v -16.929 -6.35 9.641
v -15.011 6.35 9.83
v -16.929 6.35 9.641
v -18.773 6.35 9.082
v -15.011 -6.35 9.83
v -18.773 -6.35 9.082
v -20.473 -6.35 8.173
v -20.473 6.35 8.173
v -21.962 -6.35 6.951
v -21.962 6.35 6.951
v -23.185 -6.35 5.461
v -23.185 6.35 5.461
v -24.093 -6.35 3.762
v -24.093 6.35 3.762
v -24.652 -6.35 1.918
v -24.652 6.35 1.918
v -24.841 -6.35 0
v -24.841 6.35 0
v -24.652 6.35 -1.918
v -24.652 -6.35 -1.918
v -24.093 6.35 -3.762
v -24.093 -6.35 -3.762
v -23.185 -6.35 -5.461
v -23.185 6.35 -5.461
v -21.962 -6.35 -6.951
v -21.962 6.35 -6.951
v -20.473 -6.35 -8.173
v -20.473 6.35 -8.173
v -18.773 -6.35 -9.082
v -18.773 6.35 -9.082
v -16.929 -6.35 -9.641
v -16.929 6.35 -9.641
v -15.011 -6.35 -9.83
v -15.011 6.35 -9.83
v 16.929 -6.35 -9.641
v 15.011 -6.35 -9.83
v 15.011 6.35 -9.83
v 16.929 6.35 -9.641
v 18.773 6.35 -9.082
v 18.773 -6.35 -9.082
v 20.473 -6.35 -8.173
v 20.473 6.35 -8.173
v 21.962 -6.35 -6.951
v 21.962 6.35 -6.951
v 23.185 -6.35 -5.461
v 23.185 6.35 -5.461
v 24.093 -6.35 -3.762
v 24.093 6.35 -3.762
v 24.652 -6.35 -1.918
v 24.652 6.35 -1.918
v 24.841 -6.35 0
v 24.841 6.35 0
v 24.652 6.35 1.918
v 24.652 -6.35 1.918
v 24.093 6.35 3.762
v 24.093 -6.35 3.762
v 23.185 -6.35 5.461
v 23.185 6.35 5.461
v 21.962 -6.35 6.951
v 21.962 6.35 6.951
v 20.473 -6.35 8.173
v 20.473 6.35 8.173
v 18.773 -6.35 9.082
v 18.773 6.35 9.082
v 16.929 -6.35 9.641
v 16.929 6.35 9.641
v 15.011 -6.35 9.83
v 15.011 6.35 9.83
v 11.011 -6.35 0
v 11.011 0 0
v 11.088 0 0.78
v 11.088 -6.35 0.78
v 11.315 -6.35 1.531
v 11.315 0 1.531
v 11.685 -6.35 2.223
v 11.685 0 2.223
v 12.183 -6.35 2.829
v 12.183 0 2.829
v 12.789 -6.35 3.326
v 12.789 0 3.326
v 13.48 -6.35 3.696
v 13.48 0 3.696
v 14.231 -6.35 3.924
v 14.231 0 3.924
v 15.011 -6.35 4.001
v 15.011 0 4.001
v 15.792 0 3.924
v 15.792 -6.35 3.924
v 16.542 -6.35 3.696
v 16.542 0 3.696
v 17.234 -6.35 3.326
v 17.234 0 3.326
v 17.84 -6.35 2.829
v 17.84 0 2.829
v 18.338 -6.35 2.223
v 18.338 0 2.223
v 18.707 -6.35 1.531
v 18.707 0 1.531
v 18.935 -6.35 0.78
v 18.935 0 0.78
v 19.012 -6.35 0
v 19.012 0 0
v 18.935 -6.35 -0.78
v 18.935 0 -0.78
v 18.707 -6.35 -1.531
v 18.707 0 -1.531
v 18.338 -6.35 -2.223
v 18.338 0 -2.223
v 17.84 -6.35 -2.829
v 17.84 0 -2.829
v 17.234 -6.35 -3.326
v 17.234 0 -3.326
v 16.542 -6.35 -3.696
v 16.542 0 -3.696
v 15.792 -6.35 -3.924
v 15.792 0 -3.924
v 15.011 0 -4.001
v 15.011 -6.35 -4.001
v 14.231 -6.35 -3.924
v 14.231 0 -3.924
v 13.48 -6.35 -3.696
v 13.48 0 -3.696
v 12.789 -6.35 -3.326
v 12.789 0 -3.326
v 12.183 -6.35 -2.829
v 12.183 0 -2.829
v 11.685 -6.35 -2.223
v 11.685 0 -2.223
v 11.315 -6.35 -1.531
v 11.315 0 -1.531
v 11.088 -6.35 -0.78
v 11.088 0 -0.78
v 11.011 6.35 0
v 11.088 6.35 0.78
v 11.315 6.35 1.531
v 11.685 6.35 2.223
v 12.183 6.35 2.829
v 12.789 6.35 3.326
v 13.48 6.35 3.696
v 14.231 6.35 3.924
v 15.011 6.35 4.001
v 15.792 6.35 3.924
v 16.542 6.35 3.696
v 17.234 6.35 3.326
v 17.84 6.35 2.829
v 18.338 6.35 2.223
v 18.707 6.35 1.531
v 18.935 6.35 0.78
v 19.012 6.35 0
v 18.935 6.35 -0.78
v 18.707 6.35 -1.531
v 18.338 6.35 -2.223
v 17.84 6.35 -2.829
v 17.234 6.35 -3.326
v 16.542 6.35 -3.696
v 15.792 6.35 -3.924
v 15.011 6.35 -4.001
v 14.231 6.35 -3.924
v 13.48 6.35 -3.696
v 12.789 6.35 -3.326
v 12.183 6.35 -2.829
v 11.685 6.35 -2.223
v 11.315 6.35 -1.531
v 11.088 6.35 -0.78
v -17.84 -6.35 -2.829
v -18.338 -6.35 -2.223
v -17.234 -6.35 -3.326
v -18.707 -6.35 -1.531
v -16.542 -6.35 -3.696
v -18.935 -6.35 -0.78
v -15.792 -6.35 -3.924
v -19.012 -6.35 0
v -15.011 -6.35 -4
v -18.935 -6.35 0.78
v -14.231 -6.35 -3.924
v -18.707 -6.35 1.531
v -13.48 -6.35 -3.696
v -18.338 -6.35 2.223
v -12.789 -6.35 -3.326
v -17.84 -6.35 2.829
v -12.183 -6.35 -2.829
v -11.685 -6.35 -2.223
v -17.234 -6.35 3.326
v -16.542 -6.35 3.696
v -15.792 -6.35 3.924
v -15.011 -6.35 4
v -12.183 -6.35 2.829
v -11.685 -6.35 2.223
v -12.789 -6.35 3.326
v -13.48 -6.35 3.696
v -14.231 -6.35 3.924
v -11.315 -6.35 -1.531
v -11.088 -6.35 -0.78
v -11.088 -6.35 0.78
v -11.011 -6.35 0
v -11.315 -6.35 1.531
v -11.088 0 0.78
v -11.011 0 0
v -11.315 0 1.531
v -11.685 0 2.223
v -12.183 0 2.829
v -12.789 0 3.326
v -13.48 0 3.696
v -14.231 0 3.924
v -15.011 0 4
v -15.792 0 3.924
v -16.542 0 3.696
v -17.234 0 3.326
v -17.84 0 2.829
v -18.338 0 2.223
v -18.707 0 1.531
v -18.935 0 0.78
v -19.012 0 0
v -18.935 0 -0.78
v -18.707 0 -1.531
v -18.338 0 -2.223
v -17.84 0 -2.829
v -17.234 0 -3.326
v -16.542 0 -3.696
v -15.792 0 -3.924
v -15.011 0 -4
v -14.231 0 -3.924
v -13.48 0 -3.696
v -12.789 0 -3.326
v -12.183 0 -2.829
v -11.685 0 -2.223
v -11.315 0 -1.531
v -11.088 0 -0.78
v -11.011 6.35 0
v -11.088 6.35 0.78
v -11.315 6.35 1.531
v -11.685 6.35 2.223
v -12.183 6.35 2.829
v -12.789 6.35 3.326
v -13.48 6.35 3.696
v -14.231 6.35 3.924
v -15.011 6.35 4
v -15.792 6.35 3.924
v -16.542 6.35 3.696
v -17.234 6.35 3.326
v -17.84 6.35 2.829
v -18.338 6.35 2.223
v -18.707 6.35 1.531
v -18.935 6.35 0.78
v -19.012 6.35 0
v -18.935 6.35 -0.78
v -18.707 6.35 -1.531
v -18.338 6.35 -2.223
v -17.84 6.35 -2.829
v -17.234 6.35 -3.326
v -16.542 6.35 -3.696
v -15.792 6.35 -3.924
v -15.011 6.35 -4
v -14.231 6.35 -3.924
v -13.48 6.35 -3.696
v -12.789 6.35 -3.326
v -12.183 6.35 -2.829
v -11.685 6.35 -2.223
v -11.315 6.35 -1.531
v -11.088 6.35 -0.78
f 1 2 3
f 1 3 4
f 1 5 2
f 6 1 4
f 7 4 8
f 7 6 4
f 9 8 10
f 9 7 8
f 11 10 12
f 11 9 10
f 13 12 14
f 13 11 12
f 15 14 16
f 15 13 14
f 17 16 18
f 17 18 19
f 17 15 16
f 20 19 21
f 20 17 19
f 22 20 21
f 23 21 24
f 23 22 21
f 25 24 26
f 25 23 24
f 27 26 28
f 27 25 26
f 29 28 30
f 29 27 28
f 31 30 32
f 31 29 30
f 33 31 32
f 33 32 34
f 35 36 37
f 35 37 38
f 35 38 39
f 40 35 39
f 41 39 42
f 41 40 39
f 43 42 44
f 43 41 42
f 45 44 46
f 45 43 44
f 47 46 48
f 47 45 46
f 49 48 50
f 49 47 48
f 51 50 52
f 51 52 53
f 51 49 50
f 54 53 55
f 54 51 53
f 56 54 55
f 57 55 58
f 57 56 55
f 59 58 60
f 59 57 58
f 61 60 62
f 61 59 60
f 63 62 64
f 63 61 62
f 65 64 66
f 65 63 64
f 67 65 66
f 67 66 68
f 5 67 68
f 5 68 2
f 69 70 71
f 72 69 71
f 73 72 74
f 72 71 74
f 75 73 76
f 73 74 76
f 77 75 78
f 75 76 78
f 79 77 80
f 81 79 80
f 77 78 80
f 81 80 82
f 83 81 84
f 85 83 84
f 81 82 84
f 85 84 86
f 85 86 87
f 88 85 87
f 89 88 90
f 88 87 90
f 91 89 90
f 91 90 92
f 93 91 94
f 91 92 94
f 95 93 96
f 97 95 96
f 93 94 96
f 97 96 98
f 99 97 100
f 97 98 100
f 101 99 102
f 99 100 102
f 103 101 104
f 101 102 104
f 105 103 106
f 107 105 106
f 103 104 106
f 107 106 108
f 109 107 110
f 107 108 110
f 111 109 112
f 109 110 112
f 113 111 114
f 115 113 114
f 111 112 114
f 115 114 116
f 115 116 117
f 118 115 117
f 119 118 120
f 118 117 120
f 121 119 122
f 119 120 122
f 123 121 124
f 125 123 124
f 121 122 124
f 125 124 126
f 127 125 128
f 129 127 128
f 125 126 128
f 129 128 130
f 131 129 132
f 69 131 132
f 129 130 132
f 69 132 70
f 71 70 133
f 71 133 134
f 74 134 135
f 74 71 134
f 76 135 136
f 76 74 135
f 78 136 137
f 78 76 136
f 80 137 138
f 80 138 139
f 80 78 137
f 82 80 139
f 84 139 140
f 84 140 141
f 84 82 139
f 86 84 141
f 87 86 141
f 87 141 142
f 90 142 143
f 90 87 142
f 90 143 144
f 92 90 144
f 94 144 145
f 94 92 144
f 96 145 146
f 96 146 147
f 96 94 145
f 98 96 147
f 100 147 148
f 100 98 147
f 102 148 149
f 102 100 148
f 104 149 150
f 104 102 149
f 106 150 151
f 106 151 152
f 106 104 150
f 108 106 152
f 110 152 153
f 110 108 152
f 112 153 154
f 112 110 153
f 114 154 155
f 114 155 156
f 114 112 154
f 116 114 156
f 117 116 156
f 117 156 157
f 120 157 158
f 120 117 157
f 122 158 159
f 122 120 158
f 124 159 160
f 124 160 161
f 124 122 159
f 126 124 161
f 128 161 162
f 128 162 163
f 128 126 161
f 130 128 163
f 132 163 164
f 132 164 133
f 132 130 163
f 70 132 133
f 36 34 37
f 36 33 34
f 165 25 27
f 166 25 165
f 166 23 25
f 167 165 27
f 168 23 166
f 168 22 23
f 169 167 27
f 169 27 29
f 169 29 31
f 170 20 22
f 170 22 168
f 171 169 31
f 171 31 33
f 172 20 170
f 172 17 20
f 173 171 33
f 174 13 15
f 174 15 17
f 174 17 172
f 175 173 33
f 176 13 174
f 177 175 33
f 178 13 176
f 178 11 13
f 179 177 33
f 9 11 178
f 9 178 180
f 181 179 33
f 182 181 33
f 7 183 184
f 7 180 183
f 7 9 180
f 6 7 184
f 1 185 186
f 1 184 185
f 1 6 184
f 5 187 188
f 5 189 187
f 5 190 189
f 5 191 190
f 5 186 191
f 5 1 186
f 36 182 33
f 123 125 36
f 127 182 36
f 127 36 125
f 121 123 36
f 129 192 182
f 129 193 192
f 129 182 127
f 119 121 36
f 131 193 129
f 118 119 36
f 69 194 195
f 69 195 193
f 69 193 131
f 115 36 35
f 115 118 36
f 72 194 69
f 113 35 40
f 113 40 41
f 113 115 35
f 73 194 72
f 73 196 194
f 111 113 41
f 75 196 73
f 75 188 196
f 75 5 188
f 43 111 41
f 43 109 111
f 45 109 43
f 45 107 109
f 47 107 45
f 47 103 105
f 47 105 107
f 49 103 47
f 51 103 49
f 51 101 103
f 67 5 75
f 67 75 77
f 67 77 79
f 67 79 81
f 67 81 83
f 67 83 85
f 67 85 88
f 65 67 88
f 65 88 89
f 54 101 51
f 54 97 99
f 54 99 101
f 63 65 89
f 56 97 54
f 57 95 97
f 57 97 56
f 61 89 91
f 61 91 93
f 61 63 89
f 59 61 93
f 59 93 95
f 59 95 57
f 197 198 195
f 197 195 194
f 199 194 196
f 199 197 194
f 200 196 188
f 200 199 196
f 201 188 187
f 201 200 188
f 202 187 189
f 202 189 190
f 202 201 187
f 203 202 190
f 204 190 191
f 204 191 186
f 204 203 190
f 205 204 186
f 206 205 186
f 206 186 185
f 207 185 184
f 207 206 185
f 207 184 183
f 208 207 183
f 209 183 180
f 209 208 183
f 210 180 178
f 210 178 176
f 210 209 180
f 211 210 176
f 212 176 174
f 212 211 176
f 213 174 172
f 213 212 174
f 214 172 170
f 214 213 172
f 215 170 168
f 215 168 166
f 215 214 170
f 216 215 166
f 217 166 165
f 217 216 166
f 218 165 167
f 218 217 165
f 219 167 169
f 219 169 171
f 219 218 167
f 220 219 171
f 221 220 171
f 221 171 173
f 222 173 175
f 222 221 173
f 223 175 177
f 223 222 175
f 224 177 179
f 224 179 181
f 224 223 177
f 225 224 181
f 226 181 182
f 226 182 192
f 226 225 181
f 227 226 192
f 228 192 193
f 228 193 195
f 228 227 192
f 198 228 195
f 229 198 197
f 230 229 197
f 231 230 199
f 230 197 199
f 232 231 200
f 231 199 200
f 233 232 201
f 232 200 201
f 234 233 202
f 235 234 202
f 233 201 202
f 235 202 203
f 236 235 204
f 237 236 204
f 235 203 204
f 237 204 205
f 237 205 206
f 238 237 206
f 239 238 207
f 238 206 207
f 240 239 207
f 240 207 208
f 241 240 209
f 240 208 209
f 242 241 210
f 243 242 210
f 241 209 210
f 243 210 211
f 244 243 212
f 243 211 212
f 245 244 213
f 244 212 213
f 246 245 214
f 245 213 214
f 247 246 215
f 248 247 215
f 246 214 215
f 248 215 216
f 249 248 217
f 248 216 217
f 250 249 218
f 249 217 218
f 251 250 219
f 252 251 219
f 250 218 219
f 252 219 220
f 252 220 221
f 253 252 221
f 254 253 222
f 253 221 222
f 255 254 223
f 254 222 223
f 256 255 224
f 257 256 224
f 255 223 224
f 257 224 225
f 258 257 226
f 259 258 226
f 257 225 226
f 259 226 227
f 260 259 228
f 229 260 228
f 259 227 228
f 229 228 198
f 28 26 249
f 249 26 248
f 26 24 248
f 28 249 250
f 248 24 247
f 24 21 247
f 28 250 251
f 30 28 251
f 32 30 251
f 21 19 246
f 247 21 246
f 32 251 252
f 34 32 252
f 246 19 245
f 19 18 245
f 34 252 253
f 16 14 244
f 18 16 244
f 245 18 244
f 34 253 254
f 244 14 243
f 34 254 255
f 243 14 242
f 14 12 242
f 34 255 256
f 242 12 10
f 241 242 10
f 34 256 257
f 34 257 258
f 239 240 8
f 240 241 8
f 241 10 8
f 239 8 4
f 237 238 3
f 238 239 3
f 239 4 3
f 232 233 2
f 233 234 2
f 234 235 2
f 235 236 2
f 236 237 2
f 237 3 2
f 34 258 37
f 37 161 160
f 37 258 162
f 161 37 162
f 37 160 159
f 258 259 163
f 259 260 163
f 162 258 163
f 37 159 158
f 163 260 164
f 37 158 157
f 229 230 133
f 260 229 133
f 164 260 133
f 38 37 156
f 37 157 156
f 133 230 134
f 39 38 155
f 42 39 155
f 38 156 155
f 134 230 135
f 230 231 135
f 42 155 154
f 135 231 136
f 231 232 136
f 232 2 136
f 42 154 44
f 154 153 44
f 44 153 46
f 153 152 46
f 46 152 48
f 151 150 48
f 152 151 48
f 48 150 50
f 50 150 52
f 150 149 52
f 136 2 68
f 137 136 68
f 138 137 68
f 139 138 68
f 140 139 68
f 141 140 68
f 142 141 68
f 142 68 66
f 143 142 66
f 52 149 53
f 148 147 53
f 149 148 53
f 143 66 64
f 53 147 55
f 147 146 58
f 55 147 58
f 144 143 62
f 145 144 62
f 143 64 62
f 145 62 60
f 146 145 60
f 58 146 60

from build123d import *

# Parameters (mm, degrees)
F0_R     = 4.0005
F1_DEPTH = 6.35


with BuildPart() as f1:
    # F0 (on Front) → F1 (new body, symmetric)
    with BuildSketch(Plane.XZ):
        with BuildLine():
            Line((0, -9.8298), (0, 0))
            Line((0, 0), (0, 9.8298))
            Line((0, 9.8298), (-15.0114, 9.8298))
            ThreePointArc((-15.0114, 9.8298), (-24.8412, 0), (-15.0114, -9.8298))
            Line((-15.0114, -9.8298), (0, -9.8298))
        make_face()
        with Locations((-15.0114, 0)):
            Circle(F0_R, mode=Mode.SUBTRACT)
        with BuildLine():
            Line((0, 9.8298), (0, 0))
            Line((0, 0), (0, -9.8298))
            Line((0, -9.8298), (15.0114, -9.8298))
            ThreePointArc((15.0114, -9.8298), (24.8412, 0), (15.0114, 9.8298))
            Line((15.0114, 9.8298), (0, 9.8298))
        make_face()
        with BuildLine():
            ThreePointArc((19.0119, 0), (15.0114, -4.0005), (11.0109, 0))
            ThreePointArc((11.0109, 0), (15.0114, 4.0005), (19.0119, 0))
        make_face(mode=Mode.SUBTRACT)
    extrude(amount=F1_DEPTH, both=True)


solid = f1.part
